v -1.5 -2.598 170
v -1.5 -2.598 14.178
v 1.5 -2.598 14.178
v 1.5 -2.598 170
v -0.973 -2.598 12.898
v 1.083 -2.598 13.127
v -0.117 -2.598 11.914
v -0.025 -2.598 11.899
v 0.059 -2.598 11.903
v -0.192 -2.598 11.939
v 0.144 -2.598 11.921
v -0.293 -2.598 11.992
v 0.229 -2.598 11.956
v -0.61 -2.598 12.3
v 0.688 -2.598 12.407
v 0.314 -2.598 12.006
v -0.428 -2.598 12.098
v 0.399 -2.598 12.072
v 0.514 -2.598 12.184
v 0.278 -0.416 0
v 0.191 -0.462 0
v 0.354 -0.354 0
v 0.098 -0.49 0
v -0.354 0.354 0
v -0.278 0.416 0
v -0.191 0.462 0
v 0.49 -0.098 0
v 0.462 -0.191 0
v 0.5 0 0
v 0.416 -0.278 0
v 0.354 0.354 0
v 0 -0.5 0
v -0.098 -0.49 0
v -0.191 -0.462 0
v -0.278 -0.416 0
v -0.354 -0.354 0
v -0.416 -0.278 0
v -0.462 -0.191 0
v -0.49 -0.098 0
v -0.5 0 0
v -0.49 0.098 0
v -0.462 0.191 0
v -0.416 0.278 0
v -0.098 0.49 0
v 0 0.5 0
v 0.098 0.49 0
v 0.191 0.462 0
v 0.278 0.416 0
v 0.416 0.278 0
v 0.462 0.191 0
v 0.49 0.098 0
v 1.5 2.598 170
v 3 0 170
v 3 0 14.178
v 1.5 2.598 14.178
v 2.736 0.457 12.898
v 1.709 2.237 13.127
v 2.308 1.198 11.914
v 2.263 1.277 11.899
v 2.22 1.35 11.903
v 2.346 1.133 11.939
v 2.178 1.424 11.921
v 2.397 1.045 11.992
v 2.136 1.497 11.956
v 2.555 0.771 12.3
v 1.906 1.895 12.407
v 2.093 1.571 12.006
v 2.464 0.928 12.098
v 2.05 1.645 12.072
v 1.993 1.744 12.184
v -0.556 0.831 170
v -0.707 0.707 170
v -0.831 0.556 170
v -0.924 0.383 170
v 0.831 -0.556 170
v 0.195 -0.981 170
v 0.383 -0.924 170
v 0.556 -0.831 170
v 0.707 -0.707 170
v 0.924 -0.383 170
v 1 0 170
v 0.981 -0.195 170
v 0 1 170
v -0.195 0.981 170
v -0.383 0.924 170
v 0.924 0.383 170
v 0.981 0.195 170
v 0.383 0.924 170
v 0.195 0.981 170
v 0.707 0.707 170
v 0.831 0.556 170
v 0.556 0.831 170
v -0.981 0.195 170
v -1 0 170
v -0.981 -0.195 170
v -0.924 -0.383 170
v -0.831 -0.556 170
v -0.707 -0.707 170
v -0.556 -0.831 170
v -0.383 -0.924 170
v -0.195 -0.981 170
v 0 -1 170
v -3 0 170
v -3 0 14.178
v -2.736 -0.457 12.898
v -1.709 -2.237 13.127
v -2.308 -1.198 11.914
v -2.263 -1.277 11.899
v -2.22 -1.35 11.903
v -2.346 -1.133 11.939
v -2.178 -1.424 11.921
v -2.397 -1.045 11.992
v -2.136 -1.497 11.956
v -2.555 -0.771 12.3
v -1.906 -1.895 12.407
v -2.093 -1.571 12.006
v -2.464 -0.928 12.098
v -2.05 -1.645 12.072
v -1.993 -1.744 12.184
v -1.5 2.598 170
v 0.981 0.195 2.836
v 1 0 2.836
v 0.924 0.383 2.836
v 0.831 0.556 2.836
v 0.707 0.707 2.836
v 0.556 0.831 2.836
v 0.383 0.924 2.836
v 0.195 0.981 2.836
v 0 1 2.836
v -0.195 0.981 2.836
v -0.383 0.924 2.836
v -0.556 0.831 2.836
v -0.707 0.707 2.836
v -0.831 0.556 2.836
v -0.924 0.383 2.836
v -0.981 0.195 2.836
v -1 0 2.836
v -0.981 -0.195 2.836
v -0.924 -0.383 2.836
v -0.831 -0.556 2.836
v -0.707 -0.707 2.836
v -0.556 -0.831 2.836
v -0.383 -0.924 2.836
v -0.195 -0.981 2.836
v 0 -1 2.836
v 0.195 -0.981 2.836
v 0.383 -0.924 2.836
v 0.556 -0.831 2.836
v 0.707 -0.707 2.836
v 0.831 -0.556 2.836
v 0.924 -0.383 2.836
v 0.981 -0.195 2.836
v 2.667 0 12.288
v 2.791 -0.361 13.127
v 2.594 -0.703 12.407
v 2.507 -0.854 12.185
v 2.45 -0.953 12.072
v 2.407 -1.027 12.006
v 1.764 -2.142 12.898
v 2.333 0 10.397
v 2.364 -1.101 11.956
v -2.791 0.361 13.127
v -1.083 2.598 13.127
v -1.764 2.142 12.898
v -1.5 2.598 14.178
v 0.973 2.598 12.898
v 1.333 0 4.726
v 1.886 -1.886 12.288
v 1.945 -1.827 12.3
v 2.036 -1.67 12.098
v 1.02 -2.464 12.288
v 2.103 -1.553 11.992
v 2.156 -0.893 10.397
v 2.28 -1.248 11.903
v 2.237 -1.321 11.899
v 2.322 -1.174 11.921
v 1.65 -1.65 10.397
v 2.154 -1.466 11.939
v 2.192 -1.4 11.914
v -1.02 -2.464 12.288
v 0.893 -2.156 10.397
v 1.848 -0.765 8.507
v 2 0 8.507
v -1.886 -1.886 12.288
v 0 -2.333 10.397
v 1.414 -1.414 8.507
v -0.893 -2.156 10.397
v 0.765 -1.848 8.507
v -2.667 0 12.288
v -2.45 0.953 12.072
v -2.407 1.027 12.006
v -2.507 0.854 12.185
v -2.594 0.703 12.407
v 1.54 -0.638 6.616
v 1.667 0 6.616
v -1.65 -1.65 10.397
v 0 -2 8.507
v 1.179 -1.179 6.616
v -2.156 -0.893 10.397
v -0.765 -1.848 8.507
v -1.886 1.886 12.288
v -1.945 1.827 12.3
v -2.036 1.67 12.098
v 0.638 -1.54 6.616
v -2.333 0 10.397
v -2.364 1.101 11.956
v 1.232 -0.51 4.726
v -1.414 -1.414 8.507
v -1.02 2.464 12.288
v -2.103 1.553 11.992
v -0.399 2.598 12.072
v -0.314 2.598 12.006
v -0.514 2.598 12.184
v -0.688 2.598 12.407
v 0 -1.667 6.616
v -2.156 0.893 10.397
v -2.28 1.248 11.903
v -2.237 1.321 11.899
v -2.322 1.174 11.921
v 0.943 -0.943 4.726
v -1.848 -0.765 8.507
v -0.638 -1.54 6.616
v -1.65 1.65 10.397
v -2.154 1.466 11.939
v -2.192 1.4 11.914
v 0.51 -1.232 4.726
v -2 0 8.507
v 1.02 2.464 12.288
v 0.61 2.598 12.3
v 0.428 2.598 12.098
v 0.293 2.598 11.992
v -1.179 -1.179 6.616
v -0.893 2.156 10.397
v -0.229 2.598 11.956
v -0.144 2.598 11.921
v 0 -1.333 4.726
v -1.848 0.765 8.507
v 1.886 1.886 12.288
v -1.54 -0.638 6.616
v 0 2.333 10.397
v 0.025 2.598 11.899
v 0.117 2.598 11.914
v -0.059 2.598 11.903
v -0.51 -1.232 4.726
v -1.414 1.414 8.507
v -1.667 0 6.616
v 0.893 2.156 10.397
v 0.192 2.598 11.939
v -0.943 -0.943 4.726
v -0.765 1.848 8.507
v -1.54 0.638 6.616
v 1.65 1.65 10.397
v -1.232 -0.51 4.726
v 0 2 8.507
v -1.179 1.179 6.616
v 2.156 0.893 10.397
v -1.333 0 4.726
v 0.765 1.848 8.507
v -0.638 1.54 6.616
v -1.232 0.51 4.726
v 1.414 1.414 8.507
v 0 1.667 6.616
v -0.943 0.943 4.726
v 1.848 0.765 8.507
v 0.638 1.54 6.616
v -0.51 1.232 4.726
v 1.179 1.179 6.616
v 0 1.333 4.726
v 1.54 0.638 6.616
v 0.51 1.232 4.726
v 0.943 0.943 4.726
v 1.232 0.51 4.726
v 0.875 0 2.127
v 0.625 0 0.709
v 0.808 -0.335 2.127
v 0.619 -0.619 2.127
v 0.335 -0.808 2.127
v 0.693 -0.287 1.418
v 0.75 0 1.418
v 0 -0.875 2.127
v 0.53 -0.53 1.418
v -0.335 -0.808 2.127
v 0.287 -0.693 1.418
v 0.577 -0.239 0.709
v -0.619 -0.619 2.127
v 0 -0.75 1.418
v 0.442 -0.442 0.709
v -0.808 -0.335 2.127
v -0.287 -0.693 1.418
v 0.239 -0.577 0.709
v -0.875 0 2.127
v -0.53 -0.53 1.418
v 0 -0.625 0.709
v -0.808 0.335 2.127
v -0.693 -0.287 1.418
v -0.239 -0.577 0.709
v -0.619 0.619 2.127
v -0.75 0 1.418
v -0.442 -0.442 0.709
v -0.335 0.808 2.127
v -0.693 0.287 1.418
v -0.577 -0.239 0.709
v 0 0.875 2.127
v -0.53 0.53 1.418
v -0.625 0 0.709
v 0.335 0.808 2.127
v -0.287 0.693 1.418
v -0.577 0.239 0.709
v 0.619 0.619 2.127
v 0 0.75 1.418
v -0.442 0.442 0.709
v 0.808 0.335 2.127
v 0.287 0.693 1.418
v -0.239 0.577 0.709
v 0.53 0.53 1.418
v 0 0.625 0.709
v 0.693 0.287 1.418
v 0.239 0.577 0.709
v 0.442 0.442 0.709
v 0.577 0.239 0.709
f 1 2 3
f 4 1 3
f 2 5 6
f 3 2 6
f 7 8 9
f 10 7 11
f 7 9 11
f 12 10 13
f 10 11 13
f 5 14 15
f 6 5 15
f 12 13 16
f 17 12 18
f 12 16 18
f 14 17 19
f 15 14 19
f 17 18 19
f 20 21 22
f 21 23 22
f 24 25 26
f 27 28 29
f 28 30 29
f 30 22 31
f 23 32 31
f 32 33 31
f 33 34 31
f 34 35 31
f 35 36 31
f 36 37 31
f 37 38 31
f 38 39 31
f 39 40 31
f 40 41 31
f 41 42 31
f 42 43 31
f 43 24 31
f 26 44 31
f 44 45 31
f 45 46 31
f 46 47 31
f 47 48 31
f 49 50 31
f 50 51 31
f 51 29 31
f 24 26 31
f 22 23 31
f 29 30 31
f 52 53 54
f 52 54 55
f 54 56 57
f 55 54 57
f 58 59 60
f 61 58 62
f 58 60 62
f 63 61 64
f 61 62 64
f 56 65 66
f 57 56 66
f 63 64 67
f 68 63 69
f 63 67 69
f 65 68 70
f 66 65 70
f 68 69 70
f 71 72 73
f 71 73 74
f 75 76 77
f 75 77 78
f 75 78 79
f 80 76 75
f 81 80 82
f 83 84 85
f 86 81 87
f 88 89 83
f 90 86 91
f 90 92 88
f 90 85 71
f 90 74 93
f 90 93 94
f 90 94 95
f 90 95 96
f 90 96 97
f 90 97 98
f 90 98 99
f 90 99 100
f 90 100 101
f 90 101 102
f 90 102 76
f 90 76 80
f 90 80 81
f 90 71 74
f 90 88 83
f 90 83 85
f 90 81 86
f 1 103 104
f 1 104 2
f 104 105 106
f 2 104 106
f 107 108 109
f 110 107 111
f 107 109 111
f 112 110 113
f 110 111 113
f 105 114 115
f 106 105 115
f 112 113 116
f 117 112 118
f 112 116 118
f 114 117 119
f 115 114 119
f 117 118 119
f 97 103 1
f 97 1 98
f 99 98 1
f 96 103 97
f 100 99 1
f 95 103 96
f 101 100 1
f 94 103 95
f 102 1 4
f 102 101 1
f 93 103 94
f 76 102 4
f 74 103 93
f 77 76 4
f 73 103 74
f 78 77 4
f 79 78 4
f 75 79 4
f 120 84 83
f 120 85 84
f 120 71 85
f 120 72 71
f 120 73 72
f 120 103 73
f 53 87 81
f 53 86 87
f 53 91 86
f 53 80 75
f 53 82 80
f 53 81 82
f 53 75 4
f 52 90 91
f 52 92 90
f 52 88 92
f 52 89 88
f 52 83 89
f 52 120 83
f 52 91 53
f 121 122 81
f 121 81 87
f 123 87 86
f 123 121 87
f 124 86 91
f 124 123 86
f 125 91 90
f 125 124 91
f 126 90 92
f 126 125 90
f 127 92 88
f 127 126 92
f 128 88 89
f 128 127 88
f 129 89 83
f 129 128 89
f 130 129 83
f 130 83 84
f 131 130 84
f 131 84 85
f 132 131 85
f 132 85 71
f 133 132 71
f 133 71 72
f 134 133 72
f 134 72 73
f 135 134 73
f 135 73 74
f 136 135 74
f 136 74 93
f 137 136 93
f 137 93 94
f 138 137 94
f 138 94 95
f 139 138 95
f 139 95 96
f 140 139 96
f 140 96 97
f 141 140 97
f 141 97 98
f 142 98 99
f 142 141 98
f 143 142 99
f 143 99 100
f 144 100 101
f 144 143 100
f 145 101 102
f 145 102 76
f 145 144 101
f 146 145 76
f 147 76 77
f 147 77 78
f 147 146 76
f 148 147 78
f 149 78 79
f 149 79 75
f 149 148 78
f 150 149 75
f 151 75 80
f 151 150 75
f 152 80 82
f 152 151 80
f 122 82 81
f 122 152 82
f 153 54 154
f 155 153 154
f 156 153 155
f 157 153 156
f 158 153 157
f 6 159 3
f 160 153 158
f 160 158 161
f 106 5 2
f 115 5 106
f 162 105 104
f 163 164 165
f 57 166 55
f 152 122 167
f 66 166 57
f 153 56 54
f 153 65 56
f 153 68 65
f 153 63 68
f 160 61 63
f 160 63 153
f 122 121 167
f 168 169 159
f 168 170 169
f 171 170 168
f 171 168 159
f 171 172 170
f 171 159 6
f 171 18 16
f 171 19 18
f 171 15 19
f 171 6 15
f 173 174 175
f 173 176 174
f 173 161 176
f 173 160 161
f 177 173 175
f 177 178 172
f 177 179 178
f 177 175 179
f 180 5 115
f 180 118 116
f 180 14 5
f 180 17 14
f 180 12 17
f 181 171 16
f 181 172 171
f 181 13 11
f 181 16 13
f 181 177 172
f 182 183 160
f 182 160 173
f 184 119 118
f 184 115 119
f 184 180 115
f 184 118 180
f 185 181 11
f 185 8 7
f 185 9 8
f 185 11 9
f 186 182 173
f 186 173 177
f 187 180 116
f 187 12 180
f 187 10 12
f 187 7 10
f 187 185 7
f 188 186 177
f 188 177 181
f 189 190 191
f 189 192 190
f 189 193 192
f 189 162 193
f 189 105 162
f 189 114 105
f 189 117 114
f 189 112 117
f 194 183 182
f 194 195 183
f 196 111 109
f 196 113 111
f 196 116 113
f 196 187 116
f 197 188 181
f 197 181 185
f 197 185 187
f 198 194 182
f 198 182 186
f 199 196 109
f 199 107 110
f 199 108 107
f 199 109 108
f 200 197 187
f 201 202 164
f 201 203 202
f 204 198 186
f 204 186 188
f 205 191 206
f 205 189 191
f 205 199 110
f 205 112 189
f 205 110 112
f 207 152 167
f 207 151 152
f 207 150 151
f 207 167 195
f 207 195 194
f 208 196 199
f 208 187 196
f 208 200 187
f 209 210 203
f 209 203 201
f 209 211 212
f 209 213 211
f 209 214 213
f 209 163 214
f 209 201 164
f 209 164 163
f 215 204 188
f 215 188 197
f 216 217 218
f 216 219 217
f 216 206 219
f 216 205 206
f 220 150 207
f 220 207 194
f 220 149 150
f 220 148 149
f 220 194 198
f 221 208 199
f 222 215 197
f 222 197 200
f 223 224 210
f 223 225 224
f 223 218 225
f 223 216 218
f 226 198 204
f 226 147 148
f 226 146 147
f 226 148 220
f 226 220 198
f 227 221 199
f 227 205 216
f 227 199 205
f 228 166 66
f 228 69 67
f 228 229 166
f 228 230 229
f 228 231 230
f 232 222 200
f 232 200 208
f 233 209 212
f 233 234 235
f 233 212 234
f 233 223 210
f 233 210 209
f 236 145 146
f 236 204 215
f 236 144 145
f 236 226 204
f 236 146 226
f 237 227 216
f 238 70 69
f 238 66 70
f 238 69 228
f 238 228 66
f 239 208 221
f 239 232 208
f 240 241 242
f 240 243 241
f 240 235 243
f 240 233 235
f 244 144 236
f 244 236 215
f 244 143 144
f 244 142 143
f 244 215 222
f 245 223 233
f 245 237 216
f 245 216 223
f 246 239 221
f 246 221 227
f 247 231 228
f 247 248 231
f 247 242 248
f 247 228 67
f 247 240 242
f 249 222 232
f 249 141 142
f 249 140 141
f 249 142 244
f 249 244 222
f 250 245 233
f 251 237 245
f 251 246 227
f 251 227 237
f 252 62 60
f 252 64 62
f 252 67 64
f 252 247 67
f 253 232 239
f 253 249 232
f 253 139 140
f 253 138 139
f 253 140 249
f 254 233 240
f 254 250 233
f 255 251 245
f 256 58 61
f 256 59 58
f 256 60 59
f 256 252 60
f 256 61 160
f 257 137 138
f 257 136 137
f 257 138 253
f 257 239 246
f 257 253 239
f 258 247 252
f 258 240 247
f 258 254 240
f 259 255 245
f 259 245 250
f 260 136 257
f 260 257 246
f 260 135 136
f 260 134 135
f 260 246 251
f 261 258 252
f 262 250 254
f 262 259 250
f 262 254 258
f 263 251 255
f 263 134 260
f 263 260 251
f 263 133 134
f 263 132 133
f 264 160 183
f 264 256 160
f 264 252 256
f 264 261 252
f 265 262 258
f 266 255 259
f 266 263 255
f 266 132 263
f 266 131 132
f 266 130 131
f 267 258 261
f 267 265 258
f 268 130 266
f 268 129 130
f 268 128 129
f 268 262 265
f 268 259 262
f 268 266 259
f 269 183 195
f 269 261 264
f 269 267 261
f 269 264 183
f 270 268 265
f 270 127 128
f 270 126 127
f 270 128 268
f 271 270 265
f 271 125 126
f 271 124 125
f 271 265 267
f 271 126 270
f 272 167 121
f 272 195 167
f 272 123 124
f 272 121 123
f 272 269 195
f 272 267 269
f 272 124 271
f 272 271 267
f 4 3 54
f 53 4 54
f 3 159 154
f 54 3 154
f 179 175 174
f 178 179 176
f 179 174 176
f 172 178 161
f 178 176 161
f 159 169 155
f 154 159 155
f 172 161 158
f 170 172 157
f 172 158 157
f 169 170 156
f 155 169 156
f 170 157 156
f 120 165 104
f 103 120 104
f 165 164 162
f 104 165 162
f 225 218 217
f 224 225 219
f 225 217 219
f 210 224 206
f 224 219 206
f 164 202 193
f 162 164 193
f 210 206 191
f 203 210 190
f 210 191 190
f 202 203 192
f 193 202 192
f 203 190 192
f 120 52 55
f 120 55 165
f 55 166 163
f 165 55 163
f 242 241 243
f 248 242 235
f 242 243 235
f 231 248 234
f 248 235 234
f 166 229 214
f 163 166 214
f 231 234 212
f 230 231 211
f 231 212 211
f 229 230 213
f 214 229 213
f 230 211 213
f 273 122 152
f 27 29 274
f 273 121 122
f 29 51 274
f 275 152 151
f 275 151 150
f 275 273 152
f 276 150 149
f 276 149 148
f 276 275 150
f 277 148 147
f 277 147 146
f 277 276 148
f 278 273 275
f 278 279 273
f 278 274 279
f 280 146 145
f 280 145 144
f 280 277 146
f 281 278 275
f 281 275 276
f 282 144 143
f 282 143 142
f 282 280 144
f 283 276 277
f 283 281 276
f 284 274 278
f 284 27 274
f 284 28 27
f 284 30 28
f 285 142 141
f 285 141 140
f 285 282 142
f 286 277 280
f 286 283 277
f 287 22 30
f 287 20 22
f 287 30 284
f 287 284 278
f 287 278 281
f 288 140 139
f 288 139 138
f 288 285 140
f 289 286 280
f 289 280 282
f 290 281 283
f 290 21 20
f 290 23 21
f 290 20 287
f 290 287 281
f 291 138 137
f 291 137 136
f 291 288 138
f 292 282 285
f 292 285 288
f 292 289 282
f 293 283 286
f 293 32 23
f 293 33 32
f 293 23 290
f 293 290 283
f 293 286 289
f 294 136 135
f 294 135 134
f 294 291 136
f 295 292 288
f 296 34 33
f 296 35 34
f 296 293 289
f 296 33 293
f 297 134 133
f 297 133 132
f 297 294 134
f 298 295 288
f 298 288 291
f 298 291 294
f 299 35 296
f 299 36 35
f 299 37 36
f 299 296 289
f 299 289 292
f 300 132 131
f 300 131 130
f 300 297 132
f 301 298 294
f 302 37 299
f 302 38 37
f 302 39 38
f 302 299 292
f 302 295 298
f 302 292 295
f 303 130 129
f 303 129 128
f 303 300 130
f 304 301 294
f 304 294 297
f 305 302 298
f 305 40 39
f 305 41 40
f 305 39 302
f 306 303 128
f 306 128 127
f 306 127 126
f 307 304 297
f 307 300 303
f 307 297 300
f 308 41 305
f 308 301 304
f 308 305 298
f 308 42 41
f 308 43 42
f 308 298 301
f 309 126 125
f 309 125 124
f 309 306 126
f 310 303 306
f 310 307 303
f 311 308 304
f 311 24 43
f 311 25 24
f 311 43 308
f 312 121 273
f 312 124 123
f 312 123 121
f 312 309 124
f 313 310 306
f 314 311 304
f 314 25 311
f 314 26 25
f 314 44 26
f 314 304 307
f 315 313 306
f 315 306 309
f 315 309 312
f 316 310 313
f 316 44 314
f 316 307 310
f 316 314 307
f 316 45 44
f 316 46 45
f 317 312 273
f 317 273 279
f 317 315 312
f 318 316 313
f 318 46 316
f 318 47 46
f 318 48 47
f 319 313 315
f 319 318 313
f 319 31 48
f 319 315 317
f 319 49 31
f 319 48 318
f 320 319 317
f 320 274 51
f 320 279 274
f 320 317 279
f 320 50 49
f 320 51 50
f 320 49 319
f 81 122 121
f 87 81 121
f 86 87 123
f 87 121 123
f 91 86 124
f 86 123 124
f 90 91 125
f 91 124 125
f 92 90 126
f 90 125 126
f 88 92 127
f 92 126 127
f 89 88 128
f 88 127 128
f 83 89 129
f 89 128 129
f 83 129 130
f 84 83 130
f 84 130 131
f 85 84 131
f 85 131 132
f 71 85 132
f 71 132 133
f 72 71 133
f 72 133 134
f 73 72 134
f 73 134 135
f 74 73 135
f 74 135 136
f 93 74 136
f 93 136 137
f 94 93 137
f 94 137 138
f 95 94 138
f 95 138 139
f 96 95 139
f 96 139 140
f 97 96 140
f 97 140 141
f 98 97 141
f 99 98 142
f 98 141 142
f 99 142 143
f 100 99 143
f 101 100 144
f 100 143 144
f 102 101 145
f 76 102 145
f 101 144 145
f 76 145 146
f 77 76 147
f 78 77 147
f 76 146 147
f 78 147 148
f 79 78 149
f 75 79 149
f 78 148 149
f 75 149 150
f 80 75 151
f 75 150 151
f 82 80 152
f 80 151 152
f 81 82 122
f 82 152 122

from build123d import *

# Parameters (mm, degrees)
F0_R     = 1
F1_DEPTH = 170
F2_DEPTH = 170


with BuildPart() as f1:
    # F0 (on Top) → F1 (new body)
    with BuildSketch(Plane.XY):
        Polygon((1.5, 2.598076), (-1.5, 2.598076), (-3, 0), (-1.5, -2.598076), (1.5, -2.598076), (3, 0), align=None)
        Circle(F0_R, mode=Mode.SUBTRACT)
    extrude(amount=F1_DEPTH)


with BuildPart() as f2:
    # F0 (on Top) → F2 (new body)
    with BuildSketch(Plane.XY):
        Circle(F0_R)
    extrude(amount=F2_DEPTH)


with BuildPart() as f4_tool:
    # F3 (on Front) → F4 (revolve)
    with BuildSketch(Plane.XZ):
        Polygon((3.640195, 17.808931), (0.5, 0), (3.640195, 0), align=None)
    revolve(axis=Axis((0, 0, -3.991001), (0, 0, -1)))


with BuildPart() as f1_1:
    add(f1.part)

    # F4: cut by f4_tool
    add(f4_tool.part, mode=Mode.SUBTRACT)


with BuildPart() as f2_1:
    add(f2.part)

    # F4: cut by f4_tool
    add(f4_tool.part, mode=Mode.SUBTRACT)


solid = Compound([f1_1.part, f2_1.part])
